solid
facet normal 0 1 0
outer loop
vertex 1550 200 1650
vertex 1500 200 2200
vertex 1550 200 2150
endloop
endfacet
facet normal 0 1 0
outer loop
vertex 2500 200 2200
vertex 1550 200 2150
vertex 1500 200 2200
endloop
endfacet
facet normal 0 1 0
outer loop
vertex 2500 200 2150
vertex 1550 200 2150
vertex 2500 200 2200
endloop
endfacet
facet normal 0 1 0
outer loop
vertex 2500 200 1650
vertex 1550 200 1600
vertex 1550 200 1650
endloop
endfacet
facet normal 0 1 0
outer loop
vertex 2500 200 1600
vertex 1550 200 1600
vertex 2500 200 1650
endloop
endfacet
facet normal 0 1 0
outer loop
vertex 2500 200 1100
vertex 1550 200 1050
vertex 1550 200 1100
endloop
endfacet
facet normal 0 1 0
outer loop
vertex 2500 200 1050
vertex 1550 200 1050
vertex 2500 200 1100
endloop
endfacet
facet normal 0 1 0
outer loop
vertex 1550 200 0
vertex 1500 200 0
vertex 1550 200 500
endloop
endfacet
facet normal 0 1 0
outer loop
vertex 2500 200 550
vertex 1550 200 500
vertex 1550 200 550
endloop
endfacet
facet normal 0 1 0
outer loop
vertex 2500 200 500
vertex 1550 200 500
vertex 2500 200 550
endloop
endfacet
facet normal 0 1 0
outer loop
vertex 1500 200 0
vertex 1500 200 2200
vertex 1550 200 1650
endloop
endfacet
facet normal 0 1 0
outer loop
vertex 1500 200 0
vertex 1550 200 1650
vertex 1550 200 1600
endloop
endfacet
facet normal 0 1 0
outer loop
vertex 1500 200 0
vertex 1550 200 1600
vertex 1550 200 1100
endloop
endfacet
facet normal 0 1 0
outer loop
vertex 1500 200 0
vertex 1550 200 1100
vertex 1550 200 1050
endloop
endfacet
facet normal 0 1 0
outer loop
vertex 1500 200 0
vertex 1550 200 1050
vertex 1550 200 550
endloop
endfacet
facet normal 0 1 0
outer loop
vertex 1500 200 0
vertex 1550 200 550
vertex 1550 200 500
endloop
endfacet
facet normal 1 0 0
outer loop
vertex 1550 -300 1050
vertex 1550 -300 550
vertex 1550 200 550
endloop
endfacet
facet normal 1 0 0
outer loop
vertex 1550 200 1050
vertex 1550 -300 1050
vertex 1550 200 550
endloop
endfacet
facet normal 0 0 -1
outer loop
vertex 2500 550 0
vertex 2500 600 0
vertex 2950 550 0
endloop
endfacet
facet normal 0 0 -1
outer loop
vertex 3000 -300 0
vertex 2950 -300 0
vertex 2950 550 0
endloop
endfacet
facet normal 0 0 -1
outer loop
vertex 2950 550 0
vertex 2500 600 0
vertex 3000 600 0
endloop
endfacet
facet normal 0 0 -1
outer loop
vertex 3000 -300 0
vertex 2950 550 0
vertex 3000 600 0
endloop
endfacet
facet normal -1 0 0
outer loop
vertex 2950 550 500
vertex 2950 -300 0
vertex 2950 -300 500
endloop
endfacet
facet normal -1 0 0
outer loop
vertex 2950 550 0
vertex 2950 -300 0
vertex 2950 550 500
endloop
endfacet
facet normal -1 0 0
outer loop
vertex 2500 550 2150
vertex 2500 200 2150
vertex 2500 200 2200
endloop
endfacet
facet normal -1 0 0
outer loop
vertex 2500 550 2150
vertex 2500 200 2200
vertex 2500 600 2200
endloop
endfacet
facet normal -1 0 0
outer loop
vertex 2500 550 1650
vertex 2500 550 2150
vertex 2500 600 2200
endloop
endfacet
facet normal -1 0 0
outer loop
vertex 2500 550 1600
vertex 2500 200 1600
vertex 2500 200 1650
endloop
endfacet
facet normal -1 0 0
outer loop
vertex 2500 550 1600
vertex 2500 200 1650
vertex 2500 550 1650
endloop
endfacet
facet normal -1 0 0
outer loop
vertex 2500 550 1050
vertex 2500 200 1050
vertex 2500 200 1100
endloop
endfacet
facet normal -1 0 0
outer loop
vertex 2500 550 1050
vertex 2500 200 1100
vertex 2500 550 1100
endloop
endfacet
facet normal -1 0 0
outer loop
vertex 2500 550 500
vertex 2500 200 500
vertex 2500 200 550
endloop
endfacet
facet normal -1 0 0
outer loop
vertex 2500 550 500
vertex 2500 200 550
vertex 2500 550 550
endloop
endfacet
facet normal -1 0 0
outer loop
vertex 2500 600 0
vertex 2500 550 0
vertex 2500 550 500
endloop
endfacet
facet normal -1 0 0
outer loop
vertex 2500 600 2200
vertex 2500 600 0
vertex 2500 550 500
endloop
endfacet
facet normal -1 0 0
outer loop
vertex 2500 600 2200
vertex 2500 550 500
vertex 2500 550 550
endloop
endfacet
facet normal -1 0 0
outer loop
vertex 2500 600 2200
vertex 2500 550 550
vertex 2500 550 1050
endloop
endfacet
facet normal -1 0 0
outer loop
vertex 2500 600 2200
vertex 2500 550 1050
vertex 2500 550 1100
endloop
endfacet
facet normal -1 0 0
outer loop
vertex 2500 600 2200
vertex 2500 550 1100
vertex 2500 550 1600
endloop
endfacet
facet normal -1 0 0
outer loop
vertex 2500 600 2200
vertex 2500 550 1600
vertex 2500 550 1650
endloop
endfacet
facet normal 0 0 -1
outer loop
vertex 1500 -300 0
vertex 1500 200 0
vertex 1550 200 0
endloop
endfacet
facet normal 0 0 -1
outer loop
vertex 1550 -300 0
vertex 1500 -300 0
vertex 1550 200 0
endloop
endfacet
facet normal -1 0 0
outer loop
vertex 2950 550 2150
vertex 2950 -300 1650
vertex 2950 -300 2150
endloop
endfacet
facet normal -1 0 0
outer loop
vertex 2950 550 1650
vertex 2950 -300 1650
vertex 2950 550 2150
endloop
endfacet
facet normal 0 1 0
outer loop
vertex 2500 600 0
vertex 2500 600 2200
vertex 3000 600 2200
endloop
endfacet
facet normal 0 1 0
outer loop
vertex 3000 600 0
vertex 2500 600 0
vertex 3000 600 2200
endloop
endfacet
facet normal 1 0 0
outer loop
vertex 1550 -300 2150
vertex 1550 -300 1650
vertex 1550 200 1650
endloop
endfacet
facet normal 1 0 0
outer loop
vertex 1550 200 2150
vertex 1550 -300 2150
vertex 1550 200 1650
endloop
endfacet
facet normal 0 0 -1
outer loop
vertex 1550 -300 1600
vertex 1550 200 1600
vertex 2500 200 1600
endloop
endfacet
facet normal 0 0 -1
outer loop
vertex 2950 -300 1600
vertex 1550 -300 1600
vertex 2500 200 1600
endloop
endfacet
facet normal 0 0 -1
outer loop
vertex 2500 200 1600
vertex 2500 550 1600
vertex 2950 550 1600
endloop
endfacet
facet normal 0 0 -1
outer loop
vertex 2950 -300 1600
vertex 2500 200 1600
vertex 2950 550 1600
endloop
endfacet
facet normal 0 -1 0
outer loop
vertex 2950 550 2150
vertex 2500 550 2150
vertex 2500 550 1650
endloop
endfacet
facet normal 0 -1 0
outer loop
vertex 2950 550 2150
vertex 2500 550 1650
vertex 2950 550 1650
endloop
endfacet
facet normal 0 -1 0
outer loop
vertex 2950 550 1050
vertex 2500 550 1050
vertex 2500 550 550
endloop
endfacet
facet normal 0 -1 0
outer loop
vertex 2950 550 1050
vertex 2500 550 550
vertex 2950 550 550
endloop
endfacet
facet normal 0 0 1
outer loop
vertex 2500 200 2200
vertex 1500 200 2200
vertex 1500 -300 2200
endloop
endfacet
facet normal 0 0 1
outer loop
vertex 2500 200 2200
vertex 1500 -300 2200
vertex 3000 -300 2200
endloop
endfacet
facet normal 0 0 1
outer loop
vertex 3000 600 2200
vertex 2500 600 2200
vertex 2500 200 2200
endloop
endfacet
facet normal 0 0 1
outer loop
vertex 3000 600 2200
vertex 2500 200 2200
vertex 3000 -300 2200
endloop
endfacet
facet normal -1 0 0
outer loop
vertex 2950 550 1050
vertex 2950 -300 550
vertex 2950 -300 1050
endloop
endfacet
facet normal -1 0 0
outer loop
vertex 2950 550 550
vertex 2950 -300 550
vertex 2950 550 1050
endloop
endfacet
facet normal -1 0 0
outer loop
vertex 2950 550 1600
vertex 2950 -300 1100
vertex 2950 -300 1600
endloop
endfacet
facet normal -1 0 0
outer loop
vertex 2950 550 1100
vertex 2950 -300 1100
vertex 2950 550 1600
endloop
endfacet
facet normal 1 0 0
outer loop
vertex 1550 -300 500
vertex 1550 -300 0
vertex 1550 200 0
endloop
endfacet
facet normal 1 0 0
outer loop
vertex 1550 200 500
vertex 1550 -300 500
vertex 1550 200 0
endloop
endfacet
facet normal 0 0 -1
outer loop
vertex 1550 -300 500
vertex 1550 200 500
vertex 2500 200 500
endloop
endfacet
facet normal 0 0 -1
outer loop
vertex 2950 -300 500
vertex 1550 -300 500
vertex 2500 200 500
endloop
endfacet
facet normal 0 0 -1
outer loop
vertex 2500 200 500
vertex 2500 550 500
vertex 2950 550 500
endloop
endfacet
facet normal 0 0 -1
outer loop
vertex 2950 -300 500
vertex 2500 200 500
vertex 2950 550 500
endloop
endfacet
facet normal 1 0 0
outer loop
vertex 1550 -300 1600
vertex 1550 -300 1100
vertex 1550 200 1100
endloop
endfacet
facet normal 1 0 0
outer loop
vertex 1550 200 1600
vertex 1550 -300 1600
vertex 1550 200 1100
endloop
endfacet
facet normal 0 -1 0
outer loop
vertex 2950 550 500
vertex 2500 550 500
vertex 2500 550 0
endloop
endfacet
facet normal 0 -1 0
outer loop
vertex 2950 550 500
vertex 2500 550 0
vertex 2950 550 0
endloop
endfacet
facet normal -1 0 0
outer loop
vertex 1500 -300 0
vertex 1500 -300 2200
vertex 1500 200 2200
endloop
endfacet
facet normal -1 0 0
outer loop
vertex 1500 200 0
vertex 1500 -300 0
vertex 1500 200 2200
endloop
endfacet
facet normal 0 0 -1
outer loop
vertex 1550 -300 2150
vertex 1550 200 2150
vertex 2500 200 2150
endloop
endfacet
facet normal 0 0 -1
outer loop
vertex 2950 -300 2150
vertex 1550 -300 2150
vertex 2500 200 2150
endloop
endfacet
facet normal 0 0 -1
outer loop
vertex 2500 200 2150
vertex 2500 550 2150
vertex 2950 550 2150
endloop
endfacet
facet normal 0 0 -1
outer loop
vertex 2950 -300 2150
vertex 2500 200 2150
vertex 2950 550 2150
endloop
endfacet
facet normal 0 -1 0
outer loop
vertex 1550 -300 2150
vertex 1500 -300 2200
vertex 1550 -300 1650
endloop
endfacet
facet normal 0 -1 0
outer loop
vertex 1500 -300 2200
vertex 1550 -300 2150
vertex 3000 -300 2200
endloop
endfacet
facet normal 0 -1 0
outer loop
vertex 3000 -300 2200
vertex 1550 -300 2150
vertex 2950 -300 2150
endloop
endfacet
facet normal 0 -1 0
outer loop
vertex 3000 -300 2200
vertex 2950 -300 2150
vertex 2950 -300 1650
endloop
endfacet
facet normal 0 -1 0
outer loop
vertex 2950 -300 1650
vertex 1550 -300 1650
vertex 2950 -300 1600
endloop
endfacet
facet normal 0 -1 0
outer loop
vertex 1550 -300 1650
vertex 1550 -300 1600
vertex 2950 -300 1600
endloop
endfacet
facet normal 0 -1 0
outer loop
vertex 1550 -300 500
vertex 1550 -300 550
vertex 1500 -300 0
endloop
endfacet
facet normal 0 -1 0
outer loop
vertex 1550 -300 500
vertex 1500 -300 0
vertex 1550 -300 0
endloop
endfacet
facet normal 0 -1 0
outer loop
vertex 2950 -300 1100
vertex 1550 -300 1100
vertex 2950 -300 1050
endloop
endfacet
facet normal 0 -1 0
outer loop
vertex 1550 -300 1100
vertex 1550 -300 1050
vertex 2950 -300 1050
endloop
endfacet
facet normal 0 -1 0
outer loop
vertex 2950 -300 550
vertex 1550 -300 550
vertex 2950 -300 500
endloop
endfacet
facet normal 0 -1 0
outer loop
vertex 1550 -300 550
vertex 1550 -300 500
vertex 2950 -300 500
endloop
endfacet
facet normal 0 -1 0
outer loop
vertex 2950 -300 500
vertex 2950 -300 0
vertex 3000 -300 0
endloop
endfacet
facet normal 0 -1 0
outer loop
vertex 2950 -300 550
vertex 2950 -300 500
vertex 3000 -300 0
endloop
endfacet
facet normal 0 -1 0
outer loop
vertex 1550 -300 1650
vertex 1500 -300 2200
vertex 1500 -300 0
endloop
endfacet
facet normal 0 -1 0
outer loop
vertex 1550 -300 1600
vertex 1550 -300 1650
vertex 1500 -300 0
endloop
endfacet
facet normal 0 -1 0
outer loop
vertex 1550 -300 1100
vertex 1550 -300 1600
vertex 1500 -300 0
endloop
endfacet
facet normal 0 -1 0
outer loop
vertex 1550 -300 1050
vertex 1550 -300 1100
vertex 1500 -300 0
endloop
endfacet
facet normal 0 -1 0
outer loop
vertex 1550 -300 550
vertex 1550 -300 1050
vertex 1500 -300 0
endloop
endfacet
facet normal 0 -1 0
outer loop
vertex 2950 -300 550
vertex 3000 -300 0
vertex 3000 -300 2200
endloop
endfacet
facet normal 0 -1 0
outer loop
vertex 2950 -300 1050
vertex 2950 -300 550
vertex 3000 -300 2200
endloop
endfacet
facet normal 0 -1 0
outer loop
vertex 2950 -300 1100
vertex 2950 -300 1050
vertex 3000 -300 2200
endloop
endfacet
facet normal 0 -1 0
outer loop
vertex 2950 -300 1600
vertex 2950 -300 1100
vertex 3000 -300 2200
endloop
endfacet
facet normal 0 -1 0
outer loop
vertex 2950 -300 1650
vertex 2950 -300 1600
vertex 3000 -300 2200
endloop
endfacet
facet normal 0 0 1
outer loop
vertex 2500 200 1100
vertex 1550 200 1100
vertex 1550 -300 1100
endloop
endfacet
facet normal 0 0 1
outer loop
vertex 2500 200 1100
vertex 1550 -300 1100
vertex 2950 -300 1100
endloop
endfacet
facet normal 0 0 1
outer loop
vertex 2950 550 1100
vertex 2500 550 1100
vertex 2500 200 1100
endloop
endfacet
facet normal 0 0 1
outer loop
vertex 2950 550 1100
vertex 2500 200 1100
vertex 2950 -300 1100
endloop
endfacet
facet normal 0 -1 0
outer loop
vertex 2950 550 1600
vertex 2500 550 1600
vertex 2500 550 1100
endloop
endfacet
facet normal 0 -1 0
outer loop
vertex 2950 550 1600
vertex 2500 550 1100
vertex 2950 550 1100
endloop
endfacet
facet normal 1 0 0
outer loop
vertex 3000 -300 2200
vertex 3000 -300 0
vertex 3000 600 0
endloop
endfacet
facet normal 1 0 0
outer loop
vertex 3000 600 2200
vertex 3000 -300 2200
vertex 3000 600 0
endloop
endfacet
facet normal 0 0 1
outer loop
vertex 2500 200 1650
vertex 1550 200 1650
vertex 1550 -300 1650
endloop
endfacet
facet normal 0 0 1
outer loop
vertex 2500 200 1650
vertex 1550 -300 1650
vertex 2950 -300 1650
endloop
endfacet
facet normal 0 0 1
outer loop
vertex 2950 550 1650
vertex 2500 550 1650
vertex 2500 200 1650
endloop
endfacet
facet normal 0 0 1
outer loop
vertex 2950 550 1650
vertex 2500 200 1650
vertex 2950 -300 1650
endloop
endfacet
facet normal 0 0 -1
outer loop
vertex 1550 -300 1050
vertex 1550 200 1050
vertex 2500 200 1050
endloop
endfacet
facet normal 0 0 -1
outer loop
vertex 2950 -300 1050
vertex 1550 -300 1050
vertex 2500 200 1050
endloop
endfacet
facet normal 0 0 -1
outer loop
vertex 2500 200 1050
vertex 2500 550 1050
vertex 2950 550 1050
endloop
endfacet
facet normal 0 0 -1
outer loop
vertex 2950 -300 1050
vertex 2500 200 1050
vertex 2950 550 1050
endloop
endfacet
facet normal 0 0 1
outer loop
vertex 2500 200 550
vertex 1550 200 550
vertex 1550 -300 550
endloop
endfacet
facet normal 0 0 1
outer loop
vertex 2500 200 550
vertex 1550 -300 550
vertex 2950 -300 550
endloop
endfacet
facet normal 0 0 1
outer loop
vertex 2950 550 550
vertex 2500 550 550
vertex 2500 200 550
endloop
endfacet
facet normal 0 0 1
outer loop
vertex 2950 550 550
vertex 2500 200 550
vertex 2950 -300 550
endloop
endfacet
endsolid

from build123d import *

# Parameters (mm, degrees)
BOX3529_W        = 1400
BOX3529_H        = 850
BOX3529_DEPTH    = 500
ARRAY281_Z_COUNT = 4
ARRAY281_Z_PITCH = 550
BOX3527_W        = 500
BOX3527_H        = 400
BOX3527_DEPTH    = 2200
BOX3528_W        = 1500
BOX3528_H        = 500
BOX3528_DEPTH    = 2200


with BuildPart() as array281:
    # Box3529 → Box3529 (new body)
    with BuildSketch(Plane(origin=(1550, -300, 0), x_dir=(1, 0, 0), z_dir=(0, 0, 1))):
        with Locations((700, 425)):
            Rectangle(BOX3529_W, BOX3529_H)
    extrude(amount=BOX3529_DEPTH)

    # Array281 Z: Array281 ×4


with BuildPart() as array281_1:
    add(array281.part)
    with Locations(*[(0, 0, i * ARRAY281_Z_PITCH) for i in range(1, ARRAY281_Z_COUNT)]):
        add(array281.part)


with BuildPart() as box3527:
    # Box3527 → Box3527 (new body)
    with BuildSketch(Plane(origin=(2500, 200, 0), x_dir=(1, 0, 0), z_dir=(0, 0, 1))):
        with Locations((250, 200)):
            Rectangle(BOX3527_W, BOX3527_H)
    extrude(amount=BOX3527_DEPTH)


with BuildPart() as cut003:
    # Box3528 → Box3528 (new body)
    with BuildSketch(Plane(origin=(1500, -300, 0), x_dir=(1, 0, 0), z_dir=(0, 0, 1))):
        with Locations((750, 250)):
            Rectangle(BOX3528_W, BOX3528_H)
    extrude(amount=BOX3528_DEPTH)

    # Fusion015: union Box3527
    add(box3527.part)

    # Cut003: cut Array281
    add(array281_1.part, mode=Mode.SUBTRACT)


solid = cut003.part
